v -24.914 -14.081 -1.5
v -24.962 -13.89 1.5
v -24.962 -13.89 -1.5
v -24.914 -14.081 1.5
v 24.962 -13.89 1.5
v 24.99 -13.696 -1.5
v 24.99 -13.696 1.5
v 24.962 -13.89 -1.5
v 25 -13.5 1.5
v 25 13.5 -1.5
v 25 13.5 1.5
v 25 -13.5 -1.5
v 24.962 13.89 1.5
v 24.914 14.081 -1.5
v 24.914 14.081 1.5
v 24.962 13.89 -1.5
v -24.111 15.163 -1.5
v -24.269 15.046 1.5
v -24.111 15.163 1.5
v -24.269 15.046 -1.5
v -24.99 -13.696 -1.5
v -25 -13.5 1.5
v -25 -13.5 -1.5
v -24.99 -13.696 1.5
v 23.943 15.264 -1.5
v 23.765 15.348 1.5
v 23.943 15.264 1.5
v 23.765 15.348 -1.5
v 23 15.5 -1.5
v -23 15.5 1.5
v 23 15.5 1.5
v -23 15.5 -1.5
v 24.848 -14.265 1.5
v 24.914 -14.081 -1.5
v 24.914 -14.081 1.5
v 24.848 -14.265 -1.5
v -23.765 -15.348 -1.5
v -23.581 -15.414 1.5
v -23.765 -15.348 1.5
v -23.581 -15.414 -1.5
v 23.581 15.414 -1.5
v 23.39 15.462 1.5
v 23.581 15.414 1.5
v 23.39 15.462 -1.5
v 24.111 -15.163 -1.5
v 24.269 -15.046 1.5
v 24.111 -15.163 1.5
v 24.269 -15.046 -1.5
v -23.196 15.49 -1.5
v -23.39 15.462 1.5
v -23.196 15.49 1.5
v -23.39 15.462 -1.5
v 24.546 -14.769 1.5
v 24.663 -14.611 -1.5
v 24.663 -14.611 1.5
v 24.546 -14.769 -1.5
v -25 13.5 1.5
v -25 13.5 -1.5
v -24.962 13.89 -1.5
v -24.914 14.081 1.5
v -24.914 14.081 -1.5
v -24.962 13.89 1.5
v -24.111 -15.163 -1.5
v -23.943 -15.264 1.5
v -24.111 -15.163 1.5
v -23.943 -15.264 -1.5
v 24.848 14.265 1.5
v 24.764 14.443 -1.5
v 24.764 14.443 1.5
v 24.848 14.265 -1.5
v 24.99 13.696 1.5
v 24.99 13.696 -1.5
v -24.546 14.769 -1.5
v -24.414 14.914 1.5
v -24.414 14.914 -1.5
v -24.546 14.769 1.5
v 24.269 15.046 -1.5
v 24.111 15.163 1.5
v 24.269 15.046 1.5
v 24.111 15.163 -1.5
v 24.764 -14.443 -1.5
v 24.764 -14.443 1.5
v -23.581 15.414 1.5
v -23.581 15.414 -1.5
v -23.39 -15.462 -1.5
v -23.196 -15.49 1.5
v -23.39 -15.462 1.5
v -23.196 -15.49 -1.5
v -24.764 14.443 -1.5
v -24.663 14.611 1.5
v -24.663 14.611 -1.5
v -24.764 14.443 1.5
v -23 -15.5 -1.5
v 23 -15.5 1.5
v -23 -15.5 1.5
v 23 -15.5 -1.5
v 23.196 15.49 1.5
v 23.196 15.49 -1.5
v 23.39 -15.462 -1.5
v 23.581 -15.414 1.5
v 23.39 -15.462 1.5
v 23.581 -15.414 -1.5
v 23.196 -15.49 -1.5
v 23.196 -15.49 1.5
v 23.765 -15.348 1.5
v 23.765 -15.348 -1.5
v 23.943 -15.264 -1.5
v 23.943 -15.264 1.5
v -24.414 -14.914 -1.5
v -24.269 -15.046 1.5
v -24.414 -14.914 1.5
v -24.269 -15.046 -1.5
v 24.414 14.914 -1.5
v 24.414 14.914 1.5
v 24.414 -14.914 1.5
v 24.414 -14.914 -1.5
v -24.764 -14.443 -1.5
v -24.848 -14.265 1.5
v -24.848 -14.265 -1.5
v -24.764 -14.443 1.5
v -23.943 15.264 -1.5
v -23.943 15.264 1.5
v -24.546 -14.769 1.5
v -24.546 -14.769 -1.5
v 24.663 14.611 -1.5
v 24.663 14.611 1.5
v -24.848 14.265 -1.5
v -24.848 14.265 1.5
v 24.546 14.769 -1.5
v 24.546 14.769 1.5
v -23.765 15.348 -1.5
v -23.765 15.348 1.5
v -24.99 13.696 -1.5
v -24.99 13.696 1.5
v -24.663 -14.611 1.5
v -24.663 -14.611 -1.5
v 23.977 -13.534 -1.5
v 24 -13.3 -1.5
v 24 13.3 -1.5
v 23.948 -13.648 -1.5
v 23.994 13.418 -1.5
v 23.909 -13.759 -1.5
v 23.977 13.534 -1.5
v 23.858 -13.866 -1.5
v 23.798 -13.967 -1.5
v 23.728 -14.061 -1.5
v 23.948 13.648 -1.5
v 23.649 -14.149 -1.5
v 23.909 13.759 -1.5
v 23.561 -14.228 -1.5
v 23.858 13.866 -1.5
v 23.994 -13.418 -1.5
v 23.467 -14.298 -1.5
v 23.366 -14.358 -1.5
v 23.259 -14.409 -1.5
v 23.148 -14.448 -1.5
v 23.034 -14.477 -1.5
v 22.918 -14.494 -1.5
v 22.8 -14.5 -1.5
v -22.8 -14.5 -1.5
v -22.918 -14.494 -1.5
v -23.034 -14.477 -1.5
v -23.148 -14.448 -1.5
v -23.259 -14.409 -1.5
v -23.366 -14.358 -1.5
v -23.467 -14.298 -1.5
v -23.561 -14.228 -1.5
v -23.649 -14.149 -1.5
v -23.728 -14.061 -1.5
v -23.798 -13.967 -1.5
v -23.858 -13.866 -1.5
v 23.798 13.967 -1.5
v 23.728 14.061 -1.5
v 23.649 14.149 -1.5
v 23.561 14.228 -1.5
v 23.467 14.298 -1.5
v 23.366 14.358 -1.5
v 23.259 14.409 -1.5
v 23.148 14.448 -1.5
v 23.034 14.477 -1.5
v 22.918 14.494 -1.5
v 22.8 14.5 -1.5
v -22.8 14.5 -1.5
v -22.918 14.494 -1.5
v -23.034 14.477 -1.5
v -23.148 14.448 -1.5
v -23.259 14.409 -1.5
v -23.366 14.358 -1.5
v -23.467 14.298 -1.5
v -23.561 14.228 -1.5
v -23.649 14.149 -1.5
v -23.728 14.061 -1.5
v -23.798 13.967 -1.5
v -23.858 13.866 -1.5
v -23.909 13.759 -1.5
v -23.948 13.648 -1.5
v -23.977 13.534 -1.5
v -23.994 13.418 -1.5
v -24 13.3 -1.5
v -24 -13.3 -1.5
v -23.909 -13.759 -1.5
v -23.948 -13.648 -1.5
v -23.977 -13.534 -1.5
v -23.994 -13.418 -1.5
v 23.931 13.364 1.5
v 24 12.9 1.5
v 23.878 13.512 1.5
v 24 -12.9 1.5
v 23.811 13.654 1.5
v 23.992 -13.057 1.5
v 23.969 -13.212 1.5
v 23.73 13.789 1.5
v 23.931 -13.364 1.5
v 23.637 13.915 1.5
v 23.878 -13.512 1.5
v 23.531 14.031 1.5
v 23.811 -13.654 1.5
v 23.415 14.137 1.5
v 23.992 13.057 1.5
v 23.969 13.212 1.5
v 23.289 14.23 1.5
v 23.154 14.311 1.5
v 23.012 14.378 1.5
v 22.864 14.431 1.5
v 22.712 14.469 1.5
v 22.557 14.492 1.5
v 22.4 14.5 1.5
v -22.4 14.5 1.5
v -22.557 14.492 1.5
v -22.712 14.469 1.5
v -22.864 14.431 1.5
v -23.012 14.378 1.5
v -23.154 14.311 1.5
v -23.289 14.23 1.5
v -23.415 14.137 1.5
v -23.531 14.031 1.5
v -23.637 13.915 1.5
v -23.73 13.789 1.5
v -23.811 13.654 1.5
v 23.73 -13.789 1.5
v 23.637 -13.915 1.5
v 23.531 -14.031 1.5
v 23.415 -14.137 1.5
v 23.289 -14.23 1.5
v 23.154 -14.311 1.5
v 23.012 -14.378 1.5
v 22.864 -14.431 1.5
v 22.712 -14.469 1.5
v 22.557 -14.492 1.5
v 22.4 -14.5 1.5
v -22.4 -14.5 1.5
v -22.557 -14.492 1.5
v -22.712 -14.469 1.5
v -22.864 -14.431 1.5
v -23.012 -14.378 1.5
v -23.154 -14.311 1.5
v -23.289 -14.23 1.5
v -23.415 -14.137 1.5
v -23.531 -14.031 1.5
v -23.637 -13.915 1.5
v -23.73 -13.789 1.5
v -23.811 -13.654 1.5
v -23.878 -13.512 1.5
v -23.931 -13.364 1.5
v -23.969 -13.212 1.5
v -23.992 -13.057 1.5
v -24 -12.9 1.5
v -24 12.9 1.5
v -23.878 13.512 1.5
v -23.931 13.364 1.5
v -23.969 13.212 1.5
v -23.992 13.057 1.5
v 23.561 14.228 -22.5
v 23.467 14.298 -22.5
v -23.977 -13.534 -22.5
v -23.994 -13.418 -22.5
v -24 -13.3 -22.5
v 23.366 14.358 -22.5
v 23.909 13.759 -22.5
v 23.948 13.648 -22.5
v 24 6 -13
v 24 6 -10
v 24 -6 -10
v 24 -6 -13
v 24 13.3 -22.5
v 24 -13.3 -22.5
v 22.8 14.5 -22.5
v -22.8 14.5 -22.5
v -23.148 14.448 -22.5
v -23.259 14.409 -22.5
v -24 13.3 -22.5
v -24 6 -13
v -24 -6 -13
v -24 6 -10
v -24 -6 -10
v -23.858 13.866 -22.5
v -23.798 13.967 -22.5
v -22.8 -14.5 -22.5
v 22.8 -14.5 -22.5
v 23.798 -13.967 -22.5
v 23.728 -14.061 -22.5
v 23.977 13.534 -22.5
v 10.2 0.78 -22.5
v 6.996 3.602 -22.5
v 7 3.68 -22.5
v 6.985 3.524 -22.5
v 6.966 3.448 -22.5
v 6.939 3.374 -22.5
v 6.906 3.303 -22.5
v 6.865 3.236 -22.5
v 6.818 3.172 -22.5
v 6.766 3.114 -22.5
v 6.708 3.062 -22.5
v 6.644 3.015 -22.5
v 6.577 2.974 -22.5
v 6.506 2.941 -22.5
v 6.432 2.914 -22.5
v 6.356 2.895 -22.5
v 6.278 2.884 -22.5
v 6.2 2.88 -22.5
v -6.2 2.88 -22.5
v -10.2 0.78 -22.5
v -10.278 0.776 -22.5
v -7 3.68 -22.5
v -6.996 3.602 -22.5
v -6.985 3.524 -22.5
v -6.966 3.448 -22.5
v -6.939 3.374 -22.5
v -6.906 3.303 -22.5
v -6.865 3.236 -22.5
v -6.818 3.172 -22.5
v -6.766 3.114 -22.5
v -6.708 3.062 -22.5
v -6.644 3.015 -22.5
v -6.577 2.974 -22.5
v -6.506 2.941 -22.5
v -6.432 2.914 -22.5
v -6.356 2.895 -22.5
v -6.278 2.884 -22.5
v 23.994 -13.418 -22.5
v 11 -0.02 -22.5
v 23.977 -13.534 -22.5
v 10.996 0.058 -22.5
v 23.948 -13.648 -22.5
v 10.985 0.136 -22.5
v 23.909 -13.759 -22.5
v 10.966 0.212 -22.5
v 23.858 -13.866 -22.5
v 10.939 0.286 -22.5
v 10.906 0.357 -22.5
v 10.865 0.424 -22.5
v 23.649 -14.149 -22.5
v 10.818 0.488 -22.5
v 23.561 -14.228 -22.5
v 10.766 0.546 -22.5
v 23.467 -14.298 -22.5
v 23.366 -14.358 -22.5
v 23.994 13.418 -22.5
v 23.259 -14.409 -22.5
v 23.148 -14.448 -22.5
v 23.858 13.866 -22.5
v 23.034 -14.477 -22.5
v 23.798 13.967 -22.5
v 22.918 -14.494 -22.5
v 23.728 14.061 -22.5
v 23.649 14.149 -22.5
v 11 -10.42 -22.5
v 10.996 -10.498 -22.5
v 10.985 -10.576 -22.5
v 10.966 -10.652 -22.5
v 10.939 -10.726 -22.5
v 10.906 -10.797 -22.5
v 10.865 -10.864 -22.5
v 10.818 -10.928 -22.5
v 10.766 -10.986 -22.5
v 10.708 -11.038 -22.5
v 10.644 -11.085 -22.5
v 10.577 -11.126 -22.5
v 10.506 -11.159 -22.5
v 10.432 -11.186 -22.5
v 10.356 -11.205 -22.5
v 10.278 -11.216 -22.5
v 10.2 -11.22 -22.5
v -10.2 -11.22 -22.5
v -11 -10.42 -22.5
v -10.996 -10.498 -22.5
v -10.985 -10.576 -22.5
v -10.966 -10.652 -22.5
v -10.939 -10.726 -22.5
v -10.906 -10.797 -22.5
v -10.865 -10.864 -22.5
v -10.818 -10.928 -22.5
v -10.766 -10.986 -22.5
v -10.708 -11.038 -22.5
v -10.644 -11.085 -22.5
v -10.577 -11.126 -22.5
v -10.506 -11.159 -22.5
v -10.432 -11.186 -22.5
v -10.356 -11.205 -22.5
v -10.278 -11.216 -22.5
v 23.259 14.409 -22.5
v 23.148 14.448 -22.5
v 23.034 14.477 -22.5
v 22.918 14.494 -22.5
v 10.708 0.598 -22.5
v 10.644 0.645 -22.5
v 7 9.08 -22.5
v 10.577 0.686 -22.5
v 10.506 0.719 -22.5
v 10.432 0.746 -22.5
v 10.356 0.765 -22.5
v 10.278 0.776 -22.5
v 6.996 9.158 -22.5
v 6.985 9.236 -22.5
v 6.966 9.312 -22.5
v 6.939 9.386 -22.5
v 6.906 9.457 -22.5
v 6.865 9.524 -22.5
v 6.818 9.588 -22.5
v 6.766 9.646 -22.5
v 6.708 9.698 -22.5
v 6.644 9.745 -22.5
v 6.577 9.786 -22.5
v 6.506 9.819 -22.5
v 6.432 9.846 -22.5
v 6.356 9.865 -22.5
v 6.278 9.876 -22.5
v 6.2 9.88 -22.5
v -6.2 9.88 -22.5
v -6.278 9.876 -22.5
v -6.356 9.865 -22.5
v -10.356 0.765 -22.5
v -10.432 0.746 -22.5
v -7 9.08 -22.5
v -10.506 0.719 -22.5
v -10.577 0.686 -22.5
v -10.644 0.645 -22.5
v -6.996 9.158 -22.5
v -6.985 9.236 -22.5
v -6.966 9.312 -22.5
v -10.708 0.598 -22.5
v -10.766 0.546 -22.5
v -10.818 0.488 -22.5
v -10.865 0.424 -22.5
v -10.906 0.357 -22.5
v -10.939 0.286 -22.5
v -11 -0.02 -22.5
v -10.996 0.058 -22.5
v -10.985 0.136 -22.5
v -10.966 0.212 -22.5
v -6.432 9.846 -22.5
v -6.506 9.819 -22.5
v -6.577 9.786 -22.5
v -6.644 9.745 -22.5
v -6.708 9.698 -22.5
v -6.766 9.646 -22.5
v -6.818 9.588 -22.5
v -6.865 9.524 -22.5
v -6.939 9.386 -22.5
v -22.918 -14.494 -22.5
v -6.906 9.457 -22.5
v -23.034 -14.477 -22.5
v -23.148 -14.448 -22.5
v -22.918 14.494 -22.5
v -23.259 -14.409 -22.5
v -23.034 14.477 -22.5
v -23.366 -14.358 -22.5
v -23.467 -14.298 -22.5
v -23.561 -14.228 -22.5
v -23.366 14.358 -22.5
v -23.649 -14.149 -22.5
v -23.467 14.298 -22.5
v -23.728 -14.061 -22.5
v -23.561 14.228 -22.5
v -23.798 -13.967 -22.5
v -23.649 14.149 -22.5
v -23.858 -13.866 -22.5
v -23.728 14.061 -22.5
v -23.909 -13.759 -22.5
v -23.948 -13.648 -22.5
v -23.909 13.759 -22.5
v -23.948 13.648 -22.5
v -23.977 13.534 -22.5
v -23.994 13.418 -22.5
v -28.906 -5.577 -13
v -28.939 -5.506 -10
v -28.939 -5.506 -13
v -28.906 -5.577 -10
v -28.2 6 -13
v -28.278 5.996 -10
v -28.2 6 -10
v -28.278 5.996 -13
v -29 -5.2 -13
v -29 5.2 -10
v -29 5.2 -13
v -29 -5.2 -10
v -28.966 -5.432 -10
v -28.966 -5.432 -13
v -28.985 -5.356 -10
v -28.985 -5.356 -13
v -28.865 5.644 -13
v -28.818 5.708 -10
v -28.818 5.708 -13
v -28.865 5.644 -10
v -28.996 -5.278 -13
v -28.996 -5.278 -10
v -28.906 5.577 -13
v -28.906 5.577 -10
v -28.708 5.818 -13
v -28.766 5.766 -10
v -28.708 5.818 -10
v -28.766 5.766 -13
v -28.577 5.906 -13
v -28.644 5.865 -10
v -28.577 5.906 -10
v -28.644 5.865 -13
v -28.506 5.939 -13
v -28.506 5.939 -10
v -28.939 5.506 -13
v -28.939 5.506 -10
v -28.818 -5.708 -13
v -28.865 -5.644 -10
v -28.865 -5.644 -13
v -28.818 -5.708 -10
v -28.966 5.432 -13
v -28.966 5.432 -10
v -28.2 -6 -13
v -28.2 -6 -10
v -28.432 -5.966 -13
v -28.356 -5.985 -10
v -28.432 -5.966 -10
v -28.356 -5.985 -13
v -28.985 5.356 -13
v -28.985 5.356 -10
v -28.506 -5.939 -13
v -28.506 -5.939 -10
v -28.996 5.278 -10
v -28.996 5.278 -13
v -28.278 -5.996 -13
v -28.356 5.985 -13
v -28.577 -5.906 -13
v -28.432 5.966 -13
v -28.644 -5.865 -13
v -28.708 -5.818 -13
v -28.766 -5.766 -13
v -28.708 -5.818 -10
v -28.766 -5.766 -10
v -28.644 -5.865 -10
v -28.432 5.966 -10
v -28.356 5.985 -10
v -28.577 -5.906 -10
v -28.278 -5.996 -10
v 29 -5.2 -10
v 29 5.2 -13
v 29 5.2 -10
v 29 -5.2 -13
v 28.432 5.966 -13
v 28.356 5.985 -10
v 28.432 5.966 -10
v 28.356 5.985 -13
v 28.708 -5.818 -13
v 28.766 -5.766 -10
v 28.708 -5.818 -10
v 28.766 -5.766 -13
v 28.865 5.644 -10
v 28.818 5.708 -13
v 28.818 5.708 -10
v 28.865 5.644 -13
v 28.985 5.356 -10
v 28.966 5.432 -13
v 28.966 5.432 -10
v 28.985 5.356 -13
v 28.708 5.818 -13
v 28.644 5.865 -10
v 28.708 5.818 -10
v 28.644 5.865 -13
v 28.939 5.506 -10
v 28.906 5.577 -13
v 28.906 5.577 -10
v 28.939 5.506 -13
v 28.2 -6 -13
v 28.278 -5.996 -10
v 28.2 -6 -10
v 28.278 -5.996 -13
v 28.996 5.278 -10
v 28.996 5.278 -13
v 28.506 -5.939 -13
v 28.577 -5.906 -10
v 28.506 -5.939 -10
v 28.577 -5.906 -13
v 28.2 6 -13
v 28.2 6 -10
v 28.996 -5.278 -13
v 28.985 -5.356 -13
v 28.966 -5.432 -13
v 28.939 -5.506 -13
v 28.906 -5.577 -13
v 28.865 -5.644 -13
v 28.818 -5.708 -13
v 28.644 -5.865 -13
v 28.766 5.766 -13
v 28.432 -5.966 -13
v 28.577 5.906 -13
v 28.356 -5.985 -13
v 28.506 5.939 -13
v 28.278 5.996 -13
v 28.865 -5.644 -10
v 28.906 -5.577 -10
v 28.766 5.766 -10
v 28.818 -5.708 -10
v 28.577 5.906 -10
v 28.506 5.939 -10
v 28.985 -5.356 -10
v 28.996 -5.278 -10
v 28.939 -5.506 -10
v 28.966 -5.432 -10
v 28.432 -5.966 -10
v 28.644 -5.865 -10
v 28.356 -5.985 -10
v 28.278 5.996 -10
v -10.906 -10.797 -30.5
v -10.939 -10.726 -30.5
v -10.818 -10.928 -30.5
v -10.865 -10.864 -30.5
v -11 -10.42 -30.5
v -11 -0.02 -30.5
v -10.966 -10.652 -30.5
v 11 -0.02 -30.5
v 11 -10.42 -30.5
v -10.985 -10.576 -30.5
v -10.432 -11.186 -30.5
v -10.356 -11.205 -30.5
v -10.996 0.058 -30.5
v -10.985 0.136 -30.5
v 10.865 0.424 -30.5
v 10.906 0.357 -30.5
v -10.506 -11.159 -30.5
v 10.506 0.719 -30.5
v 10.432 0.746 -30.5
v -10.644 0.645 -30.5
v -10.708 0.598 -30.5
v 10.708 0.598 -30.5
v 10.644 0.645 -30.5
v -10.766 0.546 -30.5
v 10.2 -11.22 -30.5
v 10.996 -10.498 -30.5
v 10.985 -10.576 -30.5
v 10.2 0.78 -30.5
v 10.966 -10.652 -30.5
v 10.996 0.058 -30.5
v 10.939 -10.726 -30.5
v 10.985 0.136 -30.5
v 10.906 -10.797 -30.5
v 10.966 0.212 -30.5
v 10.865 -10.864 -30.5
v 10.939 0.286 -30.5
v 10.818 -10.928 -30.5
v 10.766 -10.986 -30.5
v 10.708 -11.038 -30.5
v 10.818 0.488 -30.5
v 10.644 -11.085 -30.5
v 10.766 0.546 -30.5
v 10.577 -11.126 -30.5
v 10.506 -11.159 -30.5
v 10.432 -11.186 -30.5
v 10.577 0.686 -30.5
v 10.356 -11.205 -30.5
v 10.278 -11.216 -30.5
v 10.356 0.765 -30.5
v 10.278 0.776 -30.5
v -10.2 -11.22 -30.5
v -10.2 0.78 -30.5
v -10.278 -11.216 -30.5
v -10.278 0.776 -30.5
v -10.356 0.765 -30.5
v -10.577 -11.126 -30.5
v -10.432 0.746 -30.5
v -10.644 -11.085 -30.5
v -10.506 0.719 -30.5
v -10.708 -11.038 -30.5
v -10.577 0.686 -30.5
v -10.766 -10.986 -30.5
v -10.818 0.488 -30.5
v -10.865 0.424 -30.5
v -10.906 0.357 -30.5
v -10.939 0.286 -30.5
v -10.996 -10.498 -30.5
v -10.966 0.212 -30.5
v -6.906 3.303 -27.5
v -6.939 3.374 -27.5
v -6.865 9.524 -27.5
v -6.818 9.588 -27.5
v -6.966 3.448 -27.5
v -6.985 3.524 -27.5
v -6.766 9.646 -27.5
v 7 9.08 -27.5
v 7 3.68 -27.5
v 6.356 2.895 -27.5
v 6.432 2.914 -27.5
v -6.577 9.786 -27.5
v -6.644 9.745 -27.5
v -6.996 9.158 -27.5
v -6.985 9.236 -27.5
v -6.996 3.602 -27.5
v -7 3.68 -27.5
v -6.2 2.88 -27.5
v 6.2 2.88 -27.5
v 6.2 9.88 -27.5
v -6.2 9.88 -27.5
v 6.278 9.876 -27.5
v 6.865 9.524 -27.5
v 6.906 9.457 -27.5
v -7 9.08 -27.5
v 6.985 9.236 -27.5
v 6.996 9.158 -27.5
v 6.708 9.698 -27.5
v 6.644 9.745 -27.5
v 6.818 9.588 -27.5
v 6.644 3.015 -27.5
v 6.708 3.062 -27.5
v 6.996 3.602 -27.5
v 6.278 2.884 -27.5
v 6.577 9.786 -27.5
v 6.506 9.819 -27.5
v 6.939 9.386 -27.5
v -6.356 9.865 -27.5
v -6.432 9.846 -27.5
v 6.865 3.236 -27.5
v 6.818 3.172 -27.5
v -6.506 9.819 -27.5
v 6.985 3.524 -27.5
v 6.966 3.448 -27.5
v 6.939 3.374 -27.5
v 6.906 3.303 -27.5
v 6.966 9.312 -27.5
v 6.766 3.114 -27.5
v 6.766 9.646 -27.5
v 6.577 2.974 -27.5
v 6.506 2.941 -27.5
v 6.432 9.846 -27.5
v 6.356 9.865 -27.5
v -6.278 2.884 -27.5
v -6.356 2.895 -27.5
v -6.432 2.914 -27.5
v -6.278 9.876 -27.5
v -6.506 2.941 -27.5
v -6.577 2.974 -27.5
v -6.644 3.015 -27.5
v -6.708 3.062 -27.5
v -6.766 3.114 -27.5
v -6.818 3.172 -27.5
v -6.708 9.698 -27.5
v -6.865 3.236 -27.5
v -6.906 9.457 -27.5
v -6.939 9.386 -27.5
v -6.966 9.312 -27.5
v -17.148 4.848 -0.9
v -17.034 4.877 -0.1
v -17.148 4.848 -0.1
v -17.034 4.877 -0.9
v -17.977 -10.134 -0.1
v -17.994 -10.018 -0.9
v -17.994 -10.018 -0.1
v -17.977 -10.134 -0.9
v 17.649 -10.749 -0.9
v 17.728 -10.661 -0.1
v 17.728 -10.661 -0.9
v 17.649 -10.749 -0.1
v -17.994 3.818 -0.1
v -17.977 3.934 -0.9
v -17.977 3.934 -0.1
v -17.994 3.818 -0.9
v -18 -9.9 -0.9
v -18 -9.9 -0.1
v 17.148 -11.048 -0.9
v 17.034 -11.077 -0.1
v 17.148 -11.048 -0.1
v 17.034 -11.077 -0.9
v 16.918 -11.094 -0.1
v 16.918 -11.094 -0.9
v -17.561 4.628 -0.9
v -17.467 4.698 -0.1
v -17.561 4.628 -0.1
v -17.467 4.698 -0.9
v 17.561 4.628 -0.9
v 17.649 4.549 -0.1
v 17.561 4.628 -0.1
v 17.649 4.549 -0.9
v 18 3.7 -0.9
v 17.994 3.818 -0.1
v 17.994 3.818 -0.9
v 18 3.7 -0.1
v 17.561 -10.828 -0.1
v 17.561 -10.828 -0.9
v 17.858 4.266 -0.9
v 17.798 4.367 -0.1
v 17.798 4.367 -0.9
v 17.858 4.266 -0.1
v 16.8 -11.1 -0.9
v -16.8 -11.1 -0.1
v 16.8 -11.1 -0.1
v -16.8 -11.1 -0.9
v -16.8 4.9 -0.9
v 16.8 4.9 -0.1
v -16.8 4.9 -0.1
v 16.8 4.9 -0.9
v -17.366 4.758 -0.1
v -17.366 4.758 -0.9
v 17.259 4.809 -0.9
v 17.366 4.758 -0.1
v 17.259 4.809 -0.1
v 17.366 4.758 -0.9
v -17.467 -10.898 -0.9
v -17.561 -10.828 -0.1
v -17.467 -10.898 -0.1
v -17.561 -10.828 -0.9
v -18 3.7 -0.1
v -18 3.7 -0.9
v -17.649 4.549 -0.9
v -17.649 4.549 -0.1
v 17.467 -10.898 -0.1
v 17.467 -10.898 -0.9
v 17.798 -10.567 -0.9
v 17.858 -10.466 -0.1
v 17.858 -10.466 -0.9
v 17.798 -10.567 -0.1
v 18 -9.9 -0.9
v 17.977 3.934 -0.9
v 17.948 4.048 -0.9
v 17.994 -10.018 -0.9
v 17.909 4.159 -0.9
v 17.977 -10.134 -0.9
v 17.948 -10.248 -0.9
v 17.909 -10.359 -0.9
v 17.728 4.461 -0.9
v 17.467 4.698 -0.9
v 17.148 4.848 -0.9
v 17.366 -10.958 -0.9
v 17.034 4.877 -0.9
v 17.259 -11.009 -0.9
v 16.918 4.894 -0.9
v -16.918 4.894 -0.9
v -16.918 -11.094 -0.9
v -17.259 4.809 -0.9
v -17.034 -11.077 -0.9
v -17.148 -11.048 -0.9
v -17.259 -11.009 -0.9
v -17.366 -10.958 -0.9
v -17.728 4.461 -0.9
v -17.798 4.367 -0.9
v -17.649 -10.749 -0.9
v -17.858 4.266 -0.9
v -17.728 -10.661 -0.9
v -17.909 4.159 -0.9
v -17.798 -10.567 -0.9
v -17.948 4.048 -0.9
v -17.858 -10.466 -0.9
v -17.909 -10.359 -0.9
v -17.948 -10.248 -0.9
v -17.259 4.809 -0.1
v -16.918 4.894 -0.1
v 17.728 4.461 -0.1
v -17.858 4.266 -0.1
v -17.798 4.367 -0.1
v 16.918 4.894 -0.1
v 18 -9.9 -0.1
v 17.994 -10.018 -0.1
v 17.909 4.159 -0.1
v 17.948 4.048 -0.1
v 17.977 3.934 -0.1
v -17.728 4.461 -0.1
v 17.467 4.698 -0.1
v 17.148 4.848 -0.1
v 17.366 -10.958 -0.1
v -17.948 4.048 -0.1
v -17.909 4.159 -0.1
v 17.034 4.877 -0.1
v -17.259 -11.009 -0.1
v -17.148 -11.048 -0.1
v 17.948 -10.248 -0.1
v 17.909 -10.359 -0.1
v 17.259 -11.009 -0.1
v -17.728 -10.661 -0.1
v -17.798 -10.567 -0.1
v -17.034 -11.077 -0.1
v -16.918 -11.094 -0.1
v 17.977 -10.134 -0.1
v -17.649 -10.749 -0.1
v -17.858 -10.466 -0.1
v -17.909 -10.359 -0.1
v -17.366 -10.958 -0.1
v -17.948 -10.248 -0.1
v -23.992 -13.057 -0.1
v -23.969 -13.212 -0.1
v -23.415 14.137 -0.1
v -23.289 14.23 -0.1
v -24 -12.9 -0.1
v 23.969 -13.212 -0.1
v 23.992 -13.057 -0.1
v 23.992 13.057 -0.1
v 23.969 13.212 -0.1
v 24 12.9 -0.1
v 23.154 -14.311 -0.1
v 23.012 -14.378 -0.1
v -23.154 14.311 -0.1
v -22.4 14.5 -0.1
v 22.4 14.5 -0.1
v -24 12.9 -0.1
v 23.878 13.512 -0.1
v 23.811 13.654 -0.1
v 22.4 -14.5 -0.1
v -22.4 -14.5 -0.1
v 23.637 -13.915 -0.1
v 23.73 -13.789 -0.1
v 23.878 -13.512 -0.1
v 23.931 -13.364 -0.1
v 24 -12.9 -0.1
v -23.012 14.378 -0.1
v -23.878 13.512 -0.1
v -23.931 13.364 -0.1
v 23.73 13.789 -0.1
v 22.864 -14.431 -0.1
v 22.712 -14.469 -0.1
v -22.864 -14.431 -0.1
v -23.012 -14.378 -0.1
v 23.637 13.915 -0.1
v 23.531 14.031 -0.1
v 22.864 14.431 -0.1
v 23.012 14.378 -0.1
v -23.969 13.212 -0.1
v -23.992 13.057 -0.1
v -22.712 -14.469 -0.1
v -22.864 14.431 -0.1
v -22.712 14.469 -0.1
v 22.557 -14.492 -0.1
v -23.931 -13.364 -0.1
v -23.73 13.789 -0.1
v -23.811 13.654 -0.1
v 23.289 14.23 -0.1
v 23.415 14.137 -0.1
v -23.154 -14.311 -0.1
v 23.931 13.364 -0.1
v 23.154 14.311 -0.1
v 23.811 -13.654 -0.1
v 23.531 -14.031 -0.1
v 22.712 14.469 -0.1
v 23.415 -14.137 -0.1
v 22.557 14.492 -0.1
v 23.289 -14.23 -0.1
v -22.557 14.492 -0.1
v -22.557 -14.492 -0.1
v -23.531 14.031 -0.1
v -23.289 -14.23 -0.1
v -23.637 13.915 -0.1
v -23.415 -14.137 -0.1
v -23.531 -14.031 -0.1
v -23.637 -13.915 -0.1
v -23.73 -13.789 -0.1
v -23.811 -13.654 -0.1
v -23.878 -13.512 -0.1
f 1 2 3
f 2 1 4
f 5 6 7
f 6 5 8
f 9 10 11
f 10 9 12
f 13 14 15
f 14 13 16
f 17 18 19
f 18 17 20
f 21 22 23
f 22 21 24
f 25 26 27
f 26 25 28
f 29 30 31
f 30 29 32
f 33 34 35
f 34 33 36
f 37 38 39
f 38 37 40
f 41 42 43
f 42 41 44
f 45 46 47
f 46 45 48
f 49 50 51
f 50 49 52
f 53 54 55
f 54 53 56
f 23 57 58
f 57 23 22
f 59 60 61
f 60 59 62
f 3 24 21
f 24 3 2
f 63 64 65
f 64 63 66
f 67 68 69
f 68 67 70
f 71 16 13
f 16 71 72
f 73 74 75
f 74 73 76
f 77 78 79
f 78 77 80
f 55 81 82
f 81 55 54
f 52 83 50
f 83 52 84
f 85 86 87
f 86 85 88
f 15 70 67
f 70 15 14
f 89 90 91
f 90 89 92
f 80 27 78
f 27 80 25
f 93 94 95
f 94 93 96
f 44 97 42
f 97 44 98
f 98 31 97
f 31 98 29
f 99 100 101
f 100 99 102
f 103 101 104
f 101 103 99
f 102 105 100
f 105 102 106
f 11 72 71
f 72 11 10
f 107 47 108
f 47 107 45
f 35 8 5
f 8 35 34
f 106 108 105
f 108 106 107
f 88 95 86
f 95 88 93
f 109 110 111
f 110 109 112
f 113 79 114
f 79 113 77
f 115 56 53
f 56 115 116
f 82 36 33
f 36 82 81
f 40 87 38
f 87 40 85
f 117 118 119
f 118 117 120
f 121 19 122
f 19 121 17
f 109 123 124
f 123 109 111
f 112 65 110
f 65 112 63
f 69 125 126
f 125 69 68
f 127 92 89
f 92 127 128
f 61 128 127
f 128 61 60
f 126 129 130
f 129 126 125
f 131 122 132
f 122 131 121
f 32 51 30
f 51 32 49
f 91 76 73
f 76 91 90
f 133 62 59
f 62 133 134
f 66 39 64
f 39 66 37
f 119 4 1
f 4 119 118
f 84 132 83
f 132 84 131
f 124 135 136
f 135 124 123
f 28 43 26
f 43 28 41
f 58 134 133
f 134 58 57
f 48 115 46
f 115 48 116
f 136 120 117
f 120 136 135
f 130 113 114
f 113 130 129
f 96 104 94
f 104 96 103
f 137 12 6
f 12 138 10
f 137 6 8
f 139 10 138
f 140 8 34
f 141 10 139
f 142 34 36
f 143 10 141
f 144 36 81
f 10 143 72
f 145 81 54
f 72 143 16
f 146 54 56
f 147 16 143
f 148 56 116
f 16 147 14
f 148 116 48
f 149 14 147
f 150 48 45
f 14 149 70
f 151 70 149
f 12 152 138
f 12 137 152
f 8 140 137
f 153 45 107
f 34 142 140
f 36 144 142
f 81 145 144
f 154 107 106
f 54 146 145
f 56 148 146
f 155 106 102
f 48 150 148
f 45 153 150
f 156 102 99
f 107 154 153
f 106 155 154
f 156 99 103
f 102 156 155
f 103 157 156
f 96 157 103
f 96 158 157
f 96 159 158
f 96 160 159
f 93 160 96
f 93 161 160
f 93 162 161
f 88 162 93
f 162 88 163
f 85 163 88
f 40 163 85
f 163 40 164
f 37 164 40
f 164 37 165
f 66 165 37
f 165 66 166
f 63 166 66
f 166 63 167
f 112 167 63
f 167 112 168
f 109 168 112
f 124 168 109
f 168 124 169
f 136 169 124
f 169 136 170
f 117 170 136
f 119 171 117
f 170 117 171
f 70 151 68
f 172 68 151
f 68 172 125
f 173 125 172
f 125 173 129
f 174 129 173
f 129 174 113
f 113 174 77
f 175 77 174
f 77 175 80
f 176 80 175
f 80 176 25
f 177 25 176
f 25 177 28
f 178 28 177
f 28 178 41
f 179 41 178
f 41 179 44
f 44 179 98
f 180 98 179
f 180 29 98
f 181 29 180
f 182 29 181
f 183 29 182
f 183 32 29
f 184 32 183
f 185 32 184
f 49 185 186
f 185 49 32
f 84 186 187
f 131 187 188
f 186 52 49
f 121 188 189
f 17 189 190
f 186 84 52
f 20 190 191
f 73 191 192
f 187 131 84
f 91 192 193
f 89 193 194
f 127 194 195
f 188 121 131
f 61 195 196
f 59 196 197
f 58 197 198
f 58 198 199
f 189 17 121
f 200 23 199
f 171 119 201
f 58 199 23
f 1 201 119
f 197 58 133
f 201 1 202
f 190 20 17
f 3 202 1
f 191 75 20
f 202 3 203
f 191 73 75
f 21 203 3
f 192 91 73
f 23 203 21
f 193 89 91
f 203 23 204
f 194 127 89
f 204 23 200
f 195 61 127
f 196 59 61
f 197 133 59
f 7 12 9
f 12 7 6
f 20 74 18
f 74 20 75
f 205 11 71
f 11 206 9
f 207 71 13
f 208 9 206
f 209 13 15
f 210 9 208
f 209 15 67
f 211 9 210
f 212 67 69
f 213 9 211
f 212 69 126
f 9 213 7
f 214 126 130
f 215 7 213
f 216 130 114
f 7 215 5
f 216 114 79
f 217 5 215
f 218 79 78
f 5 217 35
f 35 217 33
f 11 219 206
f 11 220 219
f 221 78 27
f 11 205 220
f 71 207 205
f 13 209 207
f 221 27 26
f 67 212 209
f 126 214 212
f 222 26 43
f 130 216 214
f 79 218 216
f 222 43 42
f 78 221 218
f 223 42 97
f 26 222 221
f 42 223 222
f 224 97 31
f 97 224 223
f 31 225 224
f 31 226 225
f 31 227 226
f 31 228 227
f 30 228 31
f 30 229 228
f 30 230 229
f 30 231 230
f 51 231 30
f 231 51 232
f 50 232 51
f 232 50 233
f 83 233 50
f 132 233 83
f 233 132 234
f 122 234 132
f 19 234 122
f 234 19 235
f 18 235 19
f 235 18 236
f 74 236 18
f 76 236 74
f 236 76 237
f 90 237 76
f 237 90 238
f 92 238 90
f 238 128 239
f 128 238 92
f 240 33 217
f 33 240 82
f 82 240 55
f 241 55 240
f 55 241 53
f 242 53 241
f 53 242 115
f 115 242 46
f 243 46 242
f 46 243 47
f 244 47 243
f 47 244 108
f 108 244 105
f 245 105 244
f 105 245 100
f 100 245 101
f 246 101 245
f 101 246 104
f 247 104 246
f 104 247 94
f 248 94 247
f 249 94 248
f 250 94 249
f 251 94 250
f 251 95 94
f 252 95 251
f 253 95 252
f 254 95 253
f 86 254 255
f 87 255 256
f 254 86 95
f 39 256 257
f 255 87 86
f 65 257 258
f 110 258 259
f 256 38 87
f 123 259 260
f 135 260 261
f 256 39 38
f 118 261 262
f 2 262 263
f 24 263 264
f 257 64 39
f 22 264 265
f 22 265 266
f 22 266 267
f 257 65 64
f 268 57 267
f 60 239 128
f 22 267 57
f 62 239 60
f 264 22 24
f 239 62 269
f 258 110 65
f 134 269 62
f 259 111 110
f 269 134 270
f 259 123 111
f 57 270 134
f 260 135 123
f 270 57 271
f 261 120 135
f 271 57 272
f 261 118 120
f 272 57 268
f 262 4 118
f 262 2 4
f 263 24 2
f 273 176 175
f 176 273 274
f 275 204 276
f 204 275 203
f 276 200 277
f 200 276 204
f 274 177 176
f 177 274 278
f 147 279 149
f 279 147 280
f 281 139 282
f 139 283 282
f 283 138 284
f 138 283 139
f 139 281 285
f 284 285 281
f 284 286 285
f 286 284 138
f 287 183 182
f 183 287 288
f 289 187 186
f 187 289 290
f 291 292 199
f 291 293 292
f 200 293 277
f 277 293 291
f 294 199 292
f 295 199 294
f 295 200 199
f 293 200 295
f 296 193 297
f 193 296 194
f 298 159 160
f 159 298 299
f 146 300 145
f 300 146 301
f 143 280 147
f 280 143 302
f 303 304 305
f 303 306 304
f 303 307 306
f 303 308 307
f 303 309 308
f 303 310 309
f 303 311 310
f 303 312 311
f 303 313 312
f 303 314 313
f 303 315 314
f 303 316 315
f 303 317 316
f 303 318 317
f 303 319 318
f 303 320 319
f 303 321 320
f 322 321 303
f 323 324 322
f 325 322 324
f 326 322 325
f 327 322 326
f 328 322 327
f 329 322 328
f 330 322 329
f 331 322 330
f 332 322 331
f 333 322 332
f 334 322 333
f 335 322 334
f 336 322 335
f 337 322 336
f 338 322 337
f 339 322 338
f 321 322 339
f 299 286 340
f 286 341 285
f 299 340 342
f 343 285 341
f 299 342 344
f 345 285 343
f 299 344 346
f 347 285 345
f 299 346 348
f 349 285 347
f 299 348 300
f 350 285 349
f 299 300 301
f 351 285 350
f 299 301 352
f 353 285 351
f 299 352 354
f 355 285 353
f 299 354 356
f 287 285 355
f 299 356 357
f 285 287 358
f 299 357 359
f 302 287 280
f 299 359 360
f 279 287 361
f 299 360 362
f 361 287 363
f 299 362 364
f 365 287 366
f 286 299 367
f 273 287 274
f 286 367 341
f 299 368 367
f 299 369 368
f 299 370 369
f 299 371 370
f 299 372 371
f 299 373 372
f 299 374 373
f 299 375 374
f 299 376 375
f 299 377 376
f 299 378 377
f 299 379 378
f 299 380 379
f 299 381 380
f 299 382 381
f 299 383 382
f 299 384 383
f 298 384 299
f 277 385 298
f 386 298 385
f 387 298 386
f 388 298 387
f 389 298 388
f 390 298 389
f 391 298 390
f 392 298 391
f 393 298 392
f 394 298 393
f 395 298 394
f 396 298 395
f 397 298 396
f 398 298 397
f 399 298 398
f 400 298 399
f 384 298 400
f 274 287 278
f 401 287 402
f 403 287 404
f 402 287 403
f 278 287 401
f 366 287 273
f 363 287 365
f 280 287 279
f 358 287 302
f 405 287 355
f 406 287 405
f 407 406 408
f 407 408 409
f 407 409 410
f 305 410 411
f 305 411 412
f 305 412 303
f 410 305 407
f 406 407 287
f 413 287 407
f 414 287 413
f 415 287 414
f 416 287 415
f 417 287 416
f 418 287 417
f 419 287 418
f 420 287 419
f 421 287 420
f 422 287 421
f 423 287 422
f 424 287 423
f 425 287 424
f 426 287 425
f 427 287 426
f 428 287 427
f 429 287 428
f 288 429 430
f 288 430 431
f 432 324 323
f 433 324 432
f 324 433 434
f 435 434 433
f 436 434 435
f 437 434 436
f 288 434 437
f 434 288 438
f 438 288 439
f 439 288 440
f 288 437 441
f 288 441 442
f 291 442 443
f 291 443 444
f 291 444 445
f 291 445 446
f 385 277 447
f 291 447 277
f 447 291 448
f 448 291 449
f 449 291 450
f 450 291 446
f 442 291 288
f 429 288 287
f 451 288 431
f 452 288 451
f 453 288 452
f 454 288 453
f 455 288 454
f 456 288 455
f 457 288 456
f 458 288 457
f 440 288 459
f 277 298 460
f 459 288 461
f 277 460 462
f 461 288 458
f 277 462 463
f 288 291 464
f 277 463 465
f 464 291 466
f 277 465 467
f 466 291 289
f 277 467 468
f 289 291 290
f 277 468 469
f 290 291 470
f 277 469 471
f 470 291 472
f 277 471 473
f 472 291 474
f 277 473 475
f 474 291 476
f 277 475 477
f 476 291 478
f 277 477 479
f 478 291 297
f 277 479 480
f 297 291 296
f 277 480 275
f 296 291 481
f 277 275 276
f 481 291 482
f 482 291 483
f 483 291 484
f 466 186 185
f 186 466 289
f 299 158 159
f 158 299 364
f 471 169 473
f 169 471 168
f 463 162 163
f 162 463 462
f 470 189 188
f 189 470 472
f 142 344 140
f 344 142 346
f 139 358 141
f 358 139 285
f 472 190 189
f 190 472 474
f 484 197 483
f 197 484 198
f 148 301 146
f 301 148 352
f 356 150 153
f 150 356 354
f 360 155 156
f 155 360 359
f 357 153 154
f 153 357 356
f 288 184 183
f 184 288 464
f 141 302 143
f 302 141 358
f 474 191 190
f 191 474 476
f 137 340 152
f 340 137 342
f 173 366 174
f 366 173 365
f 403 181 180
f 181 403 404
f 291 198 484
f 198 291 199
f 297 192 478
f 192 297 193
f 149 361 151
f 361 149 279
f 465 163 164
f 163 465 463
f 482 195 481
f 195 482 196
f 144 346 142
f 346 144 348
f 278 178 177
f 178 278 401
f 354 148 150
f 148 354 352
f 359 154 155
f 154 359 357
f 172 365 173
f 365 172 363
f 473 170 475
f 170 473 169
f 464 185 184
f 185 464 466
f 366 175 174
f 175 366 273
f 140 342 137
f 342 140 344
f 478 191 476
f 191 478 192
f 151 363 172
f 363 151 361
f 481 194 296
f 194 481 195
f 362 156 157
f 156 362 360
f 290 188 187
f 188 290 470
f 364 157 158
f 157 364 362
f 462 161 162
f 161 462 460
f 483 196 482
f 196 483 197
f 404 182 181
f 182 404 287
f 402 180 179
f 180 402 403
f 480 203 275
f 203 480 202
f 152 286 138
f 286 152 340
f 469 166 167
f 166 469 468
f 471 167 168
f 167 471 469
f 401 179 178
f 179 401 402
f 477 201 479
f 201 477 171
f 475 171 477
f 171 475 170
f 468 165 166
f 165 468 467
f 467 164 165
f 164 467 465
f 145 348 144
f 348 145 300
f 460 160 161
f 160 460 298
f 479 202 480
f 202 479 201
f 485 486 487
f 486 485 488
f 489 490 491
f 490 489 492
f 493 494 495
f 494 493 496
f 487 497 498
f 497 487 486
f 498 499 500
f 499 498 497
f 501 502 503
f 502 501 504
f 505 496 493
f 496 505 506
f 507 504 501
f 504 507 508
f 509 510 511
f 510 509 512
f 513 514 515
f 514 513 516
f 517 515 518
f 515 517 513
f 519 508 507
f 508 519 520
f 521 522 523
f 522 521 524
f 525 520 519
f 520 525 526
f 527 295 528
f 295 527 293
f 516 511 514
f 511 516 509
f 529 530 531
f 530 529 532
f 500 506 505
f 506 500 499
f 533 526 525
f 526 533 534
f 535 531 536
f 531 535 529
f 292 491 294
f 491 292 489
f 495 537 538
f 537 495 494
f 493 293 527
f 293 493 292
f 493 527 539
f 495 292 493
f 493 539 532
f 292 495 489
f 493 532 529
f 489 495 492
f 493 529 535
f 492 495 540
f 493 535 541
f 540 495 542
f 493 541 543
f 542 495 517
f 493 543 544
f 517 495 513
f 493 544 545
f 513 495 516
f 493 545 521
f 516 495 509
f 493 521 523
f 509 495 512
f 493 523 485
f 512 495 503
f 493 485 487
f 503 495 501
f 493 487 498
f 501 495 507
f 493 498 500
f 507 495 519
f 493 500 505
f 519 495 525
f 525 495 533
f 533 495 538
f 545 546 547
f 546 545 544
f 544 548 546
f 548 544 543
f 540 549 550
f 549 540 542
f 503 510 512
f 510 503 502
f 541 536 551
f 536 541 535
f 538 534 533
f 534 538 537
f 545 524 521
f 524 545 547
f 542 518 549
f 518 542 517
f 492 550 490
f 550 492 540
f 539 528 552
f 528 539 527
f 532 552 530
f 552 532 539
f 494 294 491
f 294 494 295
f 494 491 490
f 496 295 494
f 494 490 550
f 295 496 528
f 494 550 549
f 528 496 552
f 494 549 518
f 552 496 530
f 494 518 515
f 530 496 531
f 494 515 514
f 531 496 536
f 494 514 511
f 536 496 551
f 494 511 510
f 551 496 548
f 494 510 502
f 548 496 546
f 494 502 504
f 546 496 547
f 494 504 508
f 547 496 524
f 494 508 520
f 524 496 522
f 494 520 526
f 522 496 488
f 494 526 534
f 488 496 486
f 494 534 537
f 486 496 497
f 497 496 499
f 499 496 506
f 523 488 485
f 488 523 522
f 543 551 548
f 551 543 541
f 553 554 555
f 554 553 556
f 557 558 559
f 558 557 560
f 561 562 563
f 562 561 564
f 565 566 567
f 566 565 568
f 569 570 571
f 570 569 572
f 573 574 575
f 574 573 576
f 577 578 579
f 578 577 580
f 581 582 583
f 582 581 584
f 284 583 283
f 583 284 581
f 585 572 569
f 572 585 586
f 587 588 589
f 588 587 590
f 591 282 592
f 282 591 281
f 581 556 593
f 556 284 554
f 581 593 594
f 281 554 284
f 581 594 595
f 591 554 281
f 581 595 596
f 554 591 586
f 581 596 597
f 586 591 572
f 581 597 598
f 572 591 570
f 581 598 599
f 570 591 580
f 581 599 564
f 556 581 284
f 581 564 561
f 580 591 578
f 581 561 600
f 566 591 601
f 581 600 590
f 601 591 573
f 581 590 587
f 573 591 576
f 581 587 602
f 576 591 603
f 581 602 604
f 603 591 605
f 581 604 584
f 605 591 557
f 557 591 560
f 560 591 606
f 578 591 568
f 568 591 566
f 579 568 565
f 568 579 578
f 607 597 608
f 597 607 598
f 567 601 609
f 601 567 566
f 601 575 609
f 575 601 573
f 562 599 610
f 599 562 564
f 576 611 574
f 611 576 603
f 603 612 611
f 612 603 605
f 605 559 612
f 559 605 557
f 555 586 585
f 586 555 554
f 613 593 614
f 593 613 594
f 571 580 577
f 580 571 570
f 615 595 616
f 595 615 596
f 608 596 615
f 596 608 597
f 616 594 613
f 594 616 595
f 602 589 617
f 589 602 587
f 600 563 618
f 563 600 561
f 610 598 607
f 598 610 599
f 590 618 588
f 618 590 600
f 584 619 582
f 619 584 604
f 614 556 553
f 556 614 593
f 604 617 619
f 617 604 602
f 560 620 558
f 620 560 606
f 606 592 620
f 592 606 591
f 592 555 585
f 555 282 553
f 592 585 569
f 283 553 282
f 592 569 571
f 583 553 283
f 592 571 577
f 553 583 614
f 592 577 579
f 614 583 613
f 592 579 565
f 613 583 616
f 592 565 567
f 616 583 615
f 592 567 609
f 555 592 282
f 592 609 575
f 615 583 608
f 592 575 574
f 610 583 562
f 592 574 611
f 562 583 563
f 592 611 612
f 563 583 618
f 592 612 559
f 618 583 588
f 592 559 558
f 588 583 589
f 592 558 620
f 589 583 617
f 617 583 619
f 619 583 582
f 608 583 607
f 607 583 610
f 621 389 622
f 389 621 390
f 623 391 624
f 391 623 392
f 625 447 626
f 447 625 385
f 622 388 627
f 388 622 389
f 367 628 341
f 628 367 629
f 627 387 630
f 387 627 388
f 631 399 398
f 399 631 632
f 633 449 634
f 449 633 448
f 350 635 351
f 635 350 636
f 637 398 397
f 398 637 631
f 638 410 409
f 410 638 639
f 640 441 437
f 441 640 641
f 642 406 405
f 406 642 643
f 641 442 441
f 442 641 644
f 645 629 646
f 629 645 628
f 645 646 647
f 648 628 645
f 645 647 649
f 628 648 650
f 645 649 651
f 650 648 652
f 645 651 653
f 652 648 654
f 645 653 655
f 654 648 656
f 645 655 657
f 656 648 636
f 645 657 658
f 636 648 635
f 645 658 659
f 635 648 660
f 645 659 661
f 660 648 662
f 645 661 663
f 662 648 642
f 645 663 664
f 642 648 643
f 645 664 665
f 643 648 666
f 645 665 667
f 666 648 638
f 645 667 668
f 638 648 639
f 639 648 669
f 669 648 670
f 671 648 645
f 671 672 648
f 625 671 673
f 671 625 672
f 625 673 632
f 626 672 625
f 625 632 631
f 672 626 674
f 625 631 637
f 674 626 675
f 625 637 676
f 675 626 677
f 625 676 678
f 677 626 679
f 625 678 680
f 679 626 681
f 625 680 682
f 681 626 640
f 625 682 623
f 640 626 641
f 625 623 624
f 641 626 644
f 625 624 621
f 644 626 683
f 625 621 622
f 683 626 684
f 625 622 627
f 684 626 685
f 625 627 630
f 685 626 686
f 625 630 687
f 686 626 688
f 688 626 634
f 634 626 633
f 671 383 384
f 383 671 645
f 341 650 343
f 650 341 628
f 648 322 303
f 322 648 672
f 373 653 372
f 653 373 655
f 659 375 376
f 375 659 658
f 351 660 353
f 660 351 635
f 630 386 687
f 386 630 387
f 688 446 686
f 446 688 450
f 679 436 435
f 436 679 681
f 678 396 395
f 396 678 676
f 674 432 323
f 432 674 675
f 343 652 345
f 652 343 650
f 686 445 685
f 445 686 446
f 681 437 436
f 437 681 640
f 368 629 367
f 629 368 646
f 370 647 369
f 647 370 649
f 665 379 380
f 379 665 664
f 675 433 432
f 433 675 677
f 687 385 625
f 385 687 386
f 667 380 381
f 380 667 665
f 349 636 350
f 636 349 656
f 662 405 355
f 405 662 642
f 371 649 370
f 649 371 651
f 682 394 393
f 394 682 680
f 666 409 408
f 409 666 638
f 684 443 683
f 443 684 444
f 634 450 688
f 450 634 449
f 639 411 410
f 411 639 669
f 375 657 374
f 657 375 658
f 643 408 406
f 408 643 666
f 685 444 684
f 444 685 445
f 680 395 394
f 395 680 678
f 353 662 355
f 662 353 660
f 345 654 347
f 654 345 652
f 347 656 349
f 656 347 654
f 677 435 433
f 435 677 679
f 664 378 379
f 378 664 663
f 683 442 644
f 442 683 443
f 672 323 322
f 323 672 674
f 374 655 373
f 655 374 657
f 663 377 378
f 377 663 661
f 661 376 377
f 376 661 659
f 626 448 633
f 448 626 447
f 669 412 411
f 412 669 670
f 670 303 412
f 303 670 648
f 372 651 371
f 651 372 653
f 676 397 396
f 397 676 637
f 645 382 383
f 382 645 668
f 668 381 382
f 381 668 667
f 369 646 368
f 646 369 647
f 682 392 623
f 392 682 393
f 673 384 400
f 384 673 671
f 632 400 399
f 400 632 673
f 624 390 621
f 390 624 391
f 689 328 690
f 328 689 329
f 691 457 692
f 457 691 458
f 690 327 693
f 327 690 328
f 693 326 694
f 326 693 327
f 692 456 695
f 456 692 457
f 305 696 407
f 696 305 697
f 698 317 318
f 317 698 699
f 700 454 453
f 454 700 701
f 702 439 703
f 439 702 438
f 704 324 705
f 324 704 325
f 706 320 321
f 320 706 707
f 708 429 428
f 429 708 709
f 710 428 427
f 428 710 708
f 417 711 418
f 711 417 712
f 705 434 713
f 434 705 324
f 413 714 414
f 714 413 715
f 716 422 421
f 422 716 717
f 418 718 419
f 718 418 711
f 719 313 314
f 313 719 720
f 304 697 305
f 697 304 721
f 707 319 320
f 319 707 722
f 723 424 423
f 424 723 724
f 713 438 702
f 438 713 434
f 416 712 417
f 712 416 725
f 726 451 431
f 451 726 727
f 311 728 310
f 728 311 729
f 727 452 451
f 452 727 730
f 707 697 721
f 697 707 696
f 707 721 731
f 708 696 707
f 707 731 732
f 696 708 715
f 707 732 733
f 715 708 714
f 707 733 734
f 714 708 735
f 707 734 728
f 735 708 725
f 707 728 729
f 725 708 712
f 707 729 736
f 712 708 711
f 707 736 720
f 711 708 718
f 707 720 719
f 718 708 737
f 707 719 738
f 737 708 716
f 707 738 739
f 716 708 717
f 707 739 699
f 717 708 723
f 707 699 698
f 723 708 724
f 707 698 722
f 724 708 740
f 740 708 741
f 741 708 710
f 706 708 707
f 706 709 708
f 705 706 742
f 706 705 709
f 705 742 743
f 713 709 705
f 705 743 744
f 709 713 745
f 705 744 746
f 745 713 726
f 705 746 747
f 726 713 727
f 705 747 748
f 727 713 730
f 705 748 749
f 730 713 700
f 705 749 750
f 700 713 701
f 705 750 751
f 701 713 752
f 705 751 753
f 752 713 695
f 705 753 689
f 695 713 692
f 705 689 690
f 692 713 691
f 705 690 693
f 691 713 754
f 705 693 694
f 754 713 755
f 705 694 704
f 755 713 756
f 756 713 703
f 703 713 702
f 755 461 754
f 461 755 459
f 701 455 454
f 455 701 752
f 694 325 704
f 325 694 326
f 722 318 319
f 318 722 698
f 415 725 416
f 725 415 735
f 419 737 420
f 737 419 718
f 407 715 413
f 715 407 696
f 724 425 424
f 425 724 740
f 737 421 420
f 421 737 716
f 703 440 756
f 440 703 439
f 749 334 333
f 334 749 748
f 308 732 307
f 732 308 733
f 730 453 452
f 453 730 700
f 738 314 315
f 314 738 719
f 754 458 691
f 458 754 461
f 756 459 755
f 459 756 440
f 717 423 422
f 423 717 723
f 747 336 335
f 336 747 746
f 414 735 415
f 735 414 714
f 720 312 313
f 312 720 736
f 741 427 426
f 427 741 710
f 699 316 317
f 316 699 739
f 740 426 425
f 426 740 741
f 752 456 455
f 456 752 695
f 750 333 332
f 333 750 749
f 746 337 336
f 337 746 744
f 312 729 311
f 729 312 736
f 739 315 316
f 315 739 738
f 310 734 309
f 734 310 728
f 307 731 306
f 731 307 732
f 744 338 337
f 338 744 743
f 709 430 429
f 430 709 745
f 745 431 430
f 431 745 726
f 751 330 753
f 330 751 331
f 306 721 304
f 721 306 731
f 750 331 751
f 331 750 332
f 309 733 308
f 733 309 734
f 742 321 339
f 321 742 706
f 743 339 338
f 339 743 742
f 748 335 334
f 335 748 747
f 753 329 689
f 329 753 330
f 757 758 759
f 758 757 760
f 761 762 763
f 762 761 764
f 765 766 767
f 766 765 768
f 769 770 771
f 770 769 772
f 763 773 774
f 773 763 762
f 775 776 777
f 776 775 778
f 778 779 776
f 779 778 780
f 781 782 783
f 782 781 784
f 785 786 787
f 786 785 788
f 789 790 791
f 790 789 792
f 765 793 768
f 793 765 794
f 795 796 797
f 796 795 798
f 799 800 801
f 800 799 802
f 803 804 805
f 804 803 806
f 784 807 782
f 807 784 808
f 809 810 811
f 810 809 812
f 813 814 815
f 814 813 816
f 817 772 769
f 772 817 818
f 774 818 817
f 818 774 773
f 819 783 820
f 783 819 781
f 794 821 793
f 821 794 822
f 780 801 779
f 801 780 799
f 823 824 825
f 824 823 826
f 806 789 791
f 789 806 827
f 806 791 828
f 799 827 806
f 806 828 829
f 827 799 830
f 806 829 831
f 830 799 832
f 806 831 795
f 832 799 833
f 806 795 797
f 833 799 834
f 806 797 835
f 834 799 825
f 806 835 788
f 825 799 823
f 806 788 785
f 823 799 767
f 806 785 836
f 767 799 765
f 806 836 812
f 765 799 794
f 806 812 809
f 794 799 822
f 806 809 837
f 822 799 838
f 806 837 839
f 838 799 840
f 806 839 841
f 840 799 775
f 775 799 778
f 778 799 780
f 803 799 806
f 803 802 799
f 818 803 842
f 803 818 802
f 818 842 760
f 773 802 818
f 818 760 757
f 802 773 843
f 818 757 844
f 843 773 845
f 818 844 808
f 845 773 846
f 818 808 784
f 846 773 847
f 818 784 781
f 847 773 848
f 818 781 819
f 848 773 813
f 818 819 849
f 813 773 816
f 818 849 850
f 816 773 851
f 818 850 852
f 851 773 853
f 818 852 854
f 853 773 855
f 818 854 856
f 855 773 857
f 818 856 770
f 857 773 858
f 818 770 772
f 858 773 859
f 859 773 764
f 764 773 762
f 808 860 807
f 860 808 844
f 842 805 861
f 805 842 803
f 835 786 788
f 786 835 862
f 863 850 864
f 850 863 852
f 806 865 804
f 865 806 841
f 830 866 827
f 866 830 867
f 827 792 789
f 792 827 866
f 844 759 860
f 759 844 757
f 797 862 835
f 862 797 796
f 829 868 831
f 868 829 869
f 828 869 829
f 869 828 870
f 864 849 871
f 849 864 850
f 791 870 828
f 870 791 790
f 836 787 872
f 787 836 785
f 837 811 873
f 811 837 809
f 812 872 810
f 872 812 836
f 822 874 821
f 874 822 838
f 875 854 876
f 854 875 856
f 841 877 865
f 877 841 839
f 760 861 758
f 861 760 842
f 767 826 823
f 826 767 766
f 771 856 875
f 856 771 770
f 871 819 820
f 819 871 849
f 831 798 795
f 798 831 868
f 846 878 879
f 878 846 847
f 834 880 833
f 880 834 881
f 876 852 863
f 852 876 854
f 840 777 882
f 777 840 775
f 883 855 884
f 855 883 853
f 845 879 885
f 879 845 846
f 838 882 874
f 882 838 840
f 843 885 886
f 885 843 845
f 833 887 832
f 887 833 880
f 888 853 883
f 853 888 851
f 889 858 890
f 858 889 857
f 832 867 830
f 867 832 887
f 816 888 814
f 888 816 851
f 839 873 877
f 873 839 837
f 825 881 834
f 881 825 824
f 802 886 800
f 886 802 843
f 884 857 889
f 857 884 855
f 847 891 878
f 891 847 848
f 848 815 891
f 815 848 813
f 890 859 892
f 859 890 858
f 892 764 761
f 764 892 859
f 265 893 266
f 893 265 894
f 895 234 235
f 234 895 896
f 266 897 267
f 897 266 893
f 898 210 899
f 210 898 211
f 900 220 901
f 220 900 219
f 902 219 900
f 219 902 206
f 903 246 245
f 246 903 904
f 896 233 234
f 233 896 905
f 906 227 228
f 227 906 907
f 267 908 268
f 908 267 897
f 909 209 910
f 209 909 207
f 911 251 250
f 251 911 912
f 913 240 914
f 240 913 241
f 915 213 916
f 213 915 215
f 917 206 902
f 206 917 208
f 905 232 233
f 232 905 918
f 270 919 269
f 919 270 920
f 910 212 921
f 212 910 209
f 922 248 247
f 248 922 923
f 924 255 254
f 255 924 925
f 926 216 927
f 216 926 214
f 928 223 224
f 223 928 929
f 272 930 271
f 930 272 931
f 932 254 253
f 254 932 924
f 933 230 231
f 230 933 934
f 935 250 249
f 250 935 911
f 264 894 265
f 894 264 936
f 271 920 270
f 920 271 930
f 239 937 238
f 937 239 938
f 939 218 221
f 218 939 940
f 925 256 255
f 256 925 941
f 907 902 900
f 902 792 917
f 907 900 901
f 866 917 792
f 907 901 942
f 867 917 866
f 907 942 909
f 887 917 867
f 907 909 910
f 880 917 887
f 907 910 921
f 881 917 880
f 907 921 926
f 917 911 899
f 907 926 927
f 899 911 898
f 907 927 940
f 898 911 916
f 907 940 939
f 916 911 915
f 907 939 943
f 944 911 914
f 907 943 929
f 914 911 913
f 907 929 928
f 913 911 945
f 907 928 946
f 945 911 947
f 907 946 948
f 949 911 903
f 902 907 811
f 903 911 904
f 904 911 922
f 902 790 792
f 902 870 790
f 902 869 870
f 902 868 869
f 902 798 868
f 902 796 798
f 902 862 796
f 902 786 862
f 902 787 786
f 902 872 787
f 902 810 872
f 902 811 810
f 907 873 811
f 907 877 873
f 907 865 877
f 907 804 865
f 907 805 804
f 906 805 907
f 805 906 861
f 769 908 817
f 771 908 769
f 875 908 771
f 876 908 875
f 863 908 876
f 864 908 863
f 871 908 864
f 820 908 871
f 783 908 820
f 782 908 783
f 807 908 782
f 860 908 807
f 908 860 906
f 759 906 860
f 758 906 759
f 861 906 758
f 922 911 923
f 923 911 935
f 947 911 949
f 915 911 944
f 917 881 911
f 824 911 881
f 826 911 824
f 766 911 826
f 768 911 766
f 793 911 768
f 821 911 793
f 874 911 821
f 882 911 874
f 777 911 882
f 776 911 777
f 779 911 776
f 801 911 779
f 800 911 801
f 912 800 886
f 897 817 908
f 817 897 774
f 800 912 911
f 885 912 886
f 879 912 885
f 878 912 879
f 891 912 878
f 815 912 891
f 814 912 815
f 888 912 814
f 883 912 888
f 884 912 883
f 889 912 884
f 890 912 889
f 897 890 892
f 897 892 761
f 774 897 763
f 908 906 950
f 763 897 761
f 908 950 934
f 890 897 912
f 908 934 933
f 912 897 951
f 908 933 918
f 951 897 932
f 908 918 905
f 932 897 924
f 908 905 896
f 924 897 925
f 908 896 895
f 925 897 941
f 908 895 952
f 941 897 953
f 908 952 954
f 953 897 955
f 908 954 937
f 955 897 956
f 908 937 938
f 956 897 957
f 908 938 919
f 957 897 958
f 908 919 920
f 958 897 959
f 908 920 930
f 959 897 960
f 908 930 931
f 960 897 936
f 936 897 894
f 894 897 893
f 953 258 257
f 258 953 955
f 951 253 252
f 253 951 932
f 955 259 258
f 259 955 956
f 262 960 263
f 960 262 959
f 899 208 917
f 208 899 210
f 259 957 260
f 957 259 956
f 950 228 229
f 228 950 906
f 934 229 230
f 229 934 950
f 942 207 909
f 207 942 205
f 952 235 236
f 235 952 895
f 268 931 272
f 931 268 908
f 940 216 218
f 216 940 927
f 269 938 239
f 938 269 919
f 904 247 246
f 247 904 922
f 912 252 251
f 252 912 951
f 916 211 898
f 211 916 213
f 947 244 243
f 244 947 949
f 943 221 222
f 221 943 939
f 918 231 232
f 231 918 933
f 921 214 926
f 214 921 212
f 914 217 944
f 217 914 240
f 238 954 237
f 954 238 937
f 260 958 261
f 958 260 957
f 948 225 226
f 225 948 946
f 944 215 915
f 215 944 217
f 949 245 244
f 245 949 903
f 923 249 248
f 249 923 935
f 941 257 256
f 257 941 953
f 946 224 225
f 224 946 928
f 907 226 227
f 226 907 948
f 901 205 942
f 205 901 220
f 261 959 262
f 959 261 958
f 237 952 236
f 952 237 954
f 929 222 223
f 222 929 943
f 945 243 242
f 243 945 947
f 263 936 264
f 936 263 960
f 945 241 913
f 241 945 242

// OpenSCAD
$fn = 64;

// Peacefair PZEM-001 (approximate) — ONE connected solid, no text.
// Coordinate convention:
//  - Front face points toward +Z
//  - Bezel centered at z=0 (thickness spans [-t/2, +t/2])
//  - Body extends toward -Z

// -------------------- Parameters (mm) --------------------
overall_width_mm   = 48;   // body width (X)
overall_height_mm  = 29;   // body height (Y)
overall_depth_mm   = 22;   // body depth behind bezel (Z)

bezel_width_mm     = 50;   // bezel width (X)
bezel_height_mm    = 31;   // bezel height (Y)
bezel_thickness_mm = 3;    // bezel thickness (Z)

bezel_corner_r_mm  = 2.0;

// Front features
display_window_width_mm   = 36;
display_window_height_mm  = 16;
display_window_r_mm       = 1.2;

button_count       = 2;
button_diameter_mm = 4;
button_height_mm   = 1.2;
button_spacing_mm  = 10;
button_row_offset_y_mm = 9;

// Back features (approximate)
terminal_block_w_mm = 22;
terminal_block_h_mm = 12;
terminal_block_d_mm = 9;

connector_w_mm = 14;
connector_h_mm = 7;
connector_d_mm = 6;

// Side clips/ears
clip_w_mm = 6;
clip_h_mm = 12;
clip_d_mm = 3;
clip_y_offset_mm = 0;

// Detailing
overlap_mm = 1; // ensures unions are watertight/connected

// -------------------- Helpers --------------------
module rrect2d(w, h, r) {
  rr = min(r, min(w, h)/2);
  hull() {
    for (sx = [-1, 1], sy = [-1, 1])
      translate([sx*(w/2 - rr), sy*(h/2 - rr)]) circle(r=rr);
  }
}

module rrect3d(w, h, t, r) {
  linear_extrude(height=t, center=true) rrect2d(w, h, r);
}

// Simple "step" bezel lip (adds recognizable bezel detail)
module bezel_lip(w, h, t, lip_w, lip_h, lip_t, r_outer, r_inner) {
  // Outer bezel slab + inner raised lip ring (both connected)
  union() {
    rrect3d(w, h, t, r_outer);
    // Raised ring on front face
    translate([0, 0, t/2 + lip_t/2 - overlap_mm])
      difference() {
        rrect3d(w - 2*lip_w, h - 2*lip_h, lip_t, r_inner);
        // Hollow center of ring
        rrect3d(w - 2*(lip_w + 2), h - 2*(lip_h + 2), lip_t + 2*overlap_mm, max(0.5, r_inner-0.6));
      }
  }
}

// -------------------- Main solid model --------------------
module pzem001_solid() {

  // Derived placements (FORMULAS only)
  body_center_z = -bezel_thickness_mm/2 - overall_depth_mm/2 + overlap_mm; // overlaps into bezel
  body_back_z   = body_center_z - overall_depth_mm/2;

  // Back attachments: sit behind body and overlap into it
  terminal_center_z  = body_back_z - terminal_block_d_mm/2 + overlap_mm;
  connector_center_z = body_back_z - connector_d_mm/2 + overlap_mm;

  // Side clips: touch body sides and overlap into body
  clip_left_x  = -overall_width_mm/2 - clip_w_mm/2 + overlap_mm;
  clip_right_x =  overall_width_mm/2 + clip_w_mm/2 - overlap_mm;

  // Put clips roughly mid-depth of body (not floating)
  clip_center_z = body_center_z; // centered with body so they intersect

  // Front display window: recessed pocket (not through)
  window_recess_depth = min(1.4, bezel_thickness_mm - 0.6);
  window_center_z = bezel_thickness_mm/2 - window_recess_depth/2; // pocket starts at front face
  window_y_offset = -bezel_height_mm * 0.10;

  // Add a shallow "screen bezel" frame around the window (raised ring)
  screen_frame_t = 0.8;
  screen_frame_w = 1.6;

  // Buttons on front face (protruding)
  button_center_z = bezel_thickness_mm/2 + button_height_mm/2 - overlap_mm;

  // Small "indicator" bump (common on these meters) near top-left of window area
  indicator_d = 2.2;
  indicator_h = 0.6;
  indicator_center_z = bezel_thickness_mm/2 + indicator_h/2 - overlap_mm;
  indicator_x = -display_window_width_mm/2 + indicator_d*1.2;
  indicator_y = window_y_offset + display_window_height_mm/2 + indicator_d*0.9;

  difference() {
    union() {
      // Bezel with lip detail (more recognizable than a plain slab)
      bezel_lip(
        bezel_width_mm, bezel_height_mm, bezel_thickness_mm,
        lip_w=0.8, lip_h=0.8, lip_t=0.9,
        r_outer=bezel_corner_r_mm, r_inner=1.6
      );

      // Main body (behind bezel)
      translate([0, 0, body_center_z])
        rrect3d(overall_width_mm, overall_height_mm, overall_depth_mm, 1.2);

      // Side mounting clips/ears (left/right), connected
      translate([clip_left_x, clip_y_offset_mm, clip_center_z])
        rrect3d(clip_w_mm, clip_h_mm, clip_d_mm, 0.8);

      translate([clip_right_x, clip_y_offset_mm, clip_center_z])
        rrect3d(clip_w_mm, clip_h_mm, clip_d_mm, 0.8);

      // Back terminal block (connected)
      translate([0, -overall_height_mm*0.18, terminal_center_z])
        rrect3d(terminal_block_w_mm, terminal_block_h_mm, terminal_block_d_mm, 0.8);

      // Back connector (connected)
      translate([0, overall_height_mm*0.22, connector_center_z])
        rrect3d(connector_w_mm, connector_h_mm, connector_d_mm, 0.8);

      // Raised screen frame ring on front (connected to bezel)
      translate([0, window_y_offset, bezel_thickness_mm/2 + screen_frame_t/2 - overlap_mm])
        difference() {
          rrect3d(display_window_width_mm + 2*screen_frame_w,
                  display_window_height_mm + 2*screen_frame_w,
                  screen_frame_t, 1.2);
          rrect3d(display_window_width_mm,
                  display_window_height_mm,
                  screen_frame_t + 2*overlap_mm, 1.0);
        }

      // Buttons (two), connected to bezel front
      for (i = [0:button_count-1]) {
        bx = i*button_spacing_mm - (button_count-1)*button_spacing_mm/2;
        translate([bx, button_row_offset_y_mm, button_center_z])
          cylinder(h=button_height_mm, r=button_diameter_mm/2, center=true);
      }

      // Small indicator bump (connected)
      translate([indicator_x, indicator_y, indicator_center_z])
        cylinder(h=indicator_h, r=indicator_d/2, center=true);
    }

    // Display window recess pocket (recognizable screen cutout)
    translate([0, window_y_offset, window_center_z])
      rrect3d(display_window_width_mm, display_window_height_mm,
              window_recess_depth + 2*overlap_mm, display_window_r_mm);

    // Subtle front-face relief to avoid "blank block" look (kept shallow)
    // Creates a shallow inset panel area around the screen/buttons.
    inset_t = 0.6;
    translate([0, 0, bezel_thickness_mm/2 - inset_t/2])
      rrect3d(bezel_width_mm - 2.0, bezel_height_mm - 2.0,
              inset_t + 2*overlap_mm, 1.6);
  }
}

// Render
pzem001_solid();
